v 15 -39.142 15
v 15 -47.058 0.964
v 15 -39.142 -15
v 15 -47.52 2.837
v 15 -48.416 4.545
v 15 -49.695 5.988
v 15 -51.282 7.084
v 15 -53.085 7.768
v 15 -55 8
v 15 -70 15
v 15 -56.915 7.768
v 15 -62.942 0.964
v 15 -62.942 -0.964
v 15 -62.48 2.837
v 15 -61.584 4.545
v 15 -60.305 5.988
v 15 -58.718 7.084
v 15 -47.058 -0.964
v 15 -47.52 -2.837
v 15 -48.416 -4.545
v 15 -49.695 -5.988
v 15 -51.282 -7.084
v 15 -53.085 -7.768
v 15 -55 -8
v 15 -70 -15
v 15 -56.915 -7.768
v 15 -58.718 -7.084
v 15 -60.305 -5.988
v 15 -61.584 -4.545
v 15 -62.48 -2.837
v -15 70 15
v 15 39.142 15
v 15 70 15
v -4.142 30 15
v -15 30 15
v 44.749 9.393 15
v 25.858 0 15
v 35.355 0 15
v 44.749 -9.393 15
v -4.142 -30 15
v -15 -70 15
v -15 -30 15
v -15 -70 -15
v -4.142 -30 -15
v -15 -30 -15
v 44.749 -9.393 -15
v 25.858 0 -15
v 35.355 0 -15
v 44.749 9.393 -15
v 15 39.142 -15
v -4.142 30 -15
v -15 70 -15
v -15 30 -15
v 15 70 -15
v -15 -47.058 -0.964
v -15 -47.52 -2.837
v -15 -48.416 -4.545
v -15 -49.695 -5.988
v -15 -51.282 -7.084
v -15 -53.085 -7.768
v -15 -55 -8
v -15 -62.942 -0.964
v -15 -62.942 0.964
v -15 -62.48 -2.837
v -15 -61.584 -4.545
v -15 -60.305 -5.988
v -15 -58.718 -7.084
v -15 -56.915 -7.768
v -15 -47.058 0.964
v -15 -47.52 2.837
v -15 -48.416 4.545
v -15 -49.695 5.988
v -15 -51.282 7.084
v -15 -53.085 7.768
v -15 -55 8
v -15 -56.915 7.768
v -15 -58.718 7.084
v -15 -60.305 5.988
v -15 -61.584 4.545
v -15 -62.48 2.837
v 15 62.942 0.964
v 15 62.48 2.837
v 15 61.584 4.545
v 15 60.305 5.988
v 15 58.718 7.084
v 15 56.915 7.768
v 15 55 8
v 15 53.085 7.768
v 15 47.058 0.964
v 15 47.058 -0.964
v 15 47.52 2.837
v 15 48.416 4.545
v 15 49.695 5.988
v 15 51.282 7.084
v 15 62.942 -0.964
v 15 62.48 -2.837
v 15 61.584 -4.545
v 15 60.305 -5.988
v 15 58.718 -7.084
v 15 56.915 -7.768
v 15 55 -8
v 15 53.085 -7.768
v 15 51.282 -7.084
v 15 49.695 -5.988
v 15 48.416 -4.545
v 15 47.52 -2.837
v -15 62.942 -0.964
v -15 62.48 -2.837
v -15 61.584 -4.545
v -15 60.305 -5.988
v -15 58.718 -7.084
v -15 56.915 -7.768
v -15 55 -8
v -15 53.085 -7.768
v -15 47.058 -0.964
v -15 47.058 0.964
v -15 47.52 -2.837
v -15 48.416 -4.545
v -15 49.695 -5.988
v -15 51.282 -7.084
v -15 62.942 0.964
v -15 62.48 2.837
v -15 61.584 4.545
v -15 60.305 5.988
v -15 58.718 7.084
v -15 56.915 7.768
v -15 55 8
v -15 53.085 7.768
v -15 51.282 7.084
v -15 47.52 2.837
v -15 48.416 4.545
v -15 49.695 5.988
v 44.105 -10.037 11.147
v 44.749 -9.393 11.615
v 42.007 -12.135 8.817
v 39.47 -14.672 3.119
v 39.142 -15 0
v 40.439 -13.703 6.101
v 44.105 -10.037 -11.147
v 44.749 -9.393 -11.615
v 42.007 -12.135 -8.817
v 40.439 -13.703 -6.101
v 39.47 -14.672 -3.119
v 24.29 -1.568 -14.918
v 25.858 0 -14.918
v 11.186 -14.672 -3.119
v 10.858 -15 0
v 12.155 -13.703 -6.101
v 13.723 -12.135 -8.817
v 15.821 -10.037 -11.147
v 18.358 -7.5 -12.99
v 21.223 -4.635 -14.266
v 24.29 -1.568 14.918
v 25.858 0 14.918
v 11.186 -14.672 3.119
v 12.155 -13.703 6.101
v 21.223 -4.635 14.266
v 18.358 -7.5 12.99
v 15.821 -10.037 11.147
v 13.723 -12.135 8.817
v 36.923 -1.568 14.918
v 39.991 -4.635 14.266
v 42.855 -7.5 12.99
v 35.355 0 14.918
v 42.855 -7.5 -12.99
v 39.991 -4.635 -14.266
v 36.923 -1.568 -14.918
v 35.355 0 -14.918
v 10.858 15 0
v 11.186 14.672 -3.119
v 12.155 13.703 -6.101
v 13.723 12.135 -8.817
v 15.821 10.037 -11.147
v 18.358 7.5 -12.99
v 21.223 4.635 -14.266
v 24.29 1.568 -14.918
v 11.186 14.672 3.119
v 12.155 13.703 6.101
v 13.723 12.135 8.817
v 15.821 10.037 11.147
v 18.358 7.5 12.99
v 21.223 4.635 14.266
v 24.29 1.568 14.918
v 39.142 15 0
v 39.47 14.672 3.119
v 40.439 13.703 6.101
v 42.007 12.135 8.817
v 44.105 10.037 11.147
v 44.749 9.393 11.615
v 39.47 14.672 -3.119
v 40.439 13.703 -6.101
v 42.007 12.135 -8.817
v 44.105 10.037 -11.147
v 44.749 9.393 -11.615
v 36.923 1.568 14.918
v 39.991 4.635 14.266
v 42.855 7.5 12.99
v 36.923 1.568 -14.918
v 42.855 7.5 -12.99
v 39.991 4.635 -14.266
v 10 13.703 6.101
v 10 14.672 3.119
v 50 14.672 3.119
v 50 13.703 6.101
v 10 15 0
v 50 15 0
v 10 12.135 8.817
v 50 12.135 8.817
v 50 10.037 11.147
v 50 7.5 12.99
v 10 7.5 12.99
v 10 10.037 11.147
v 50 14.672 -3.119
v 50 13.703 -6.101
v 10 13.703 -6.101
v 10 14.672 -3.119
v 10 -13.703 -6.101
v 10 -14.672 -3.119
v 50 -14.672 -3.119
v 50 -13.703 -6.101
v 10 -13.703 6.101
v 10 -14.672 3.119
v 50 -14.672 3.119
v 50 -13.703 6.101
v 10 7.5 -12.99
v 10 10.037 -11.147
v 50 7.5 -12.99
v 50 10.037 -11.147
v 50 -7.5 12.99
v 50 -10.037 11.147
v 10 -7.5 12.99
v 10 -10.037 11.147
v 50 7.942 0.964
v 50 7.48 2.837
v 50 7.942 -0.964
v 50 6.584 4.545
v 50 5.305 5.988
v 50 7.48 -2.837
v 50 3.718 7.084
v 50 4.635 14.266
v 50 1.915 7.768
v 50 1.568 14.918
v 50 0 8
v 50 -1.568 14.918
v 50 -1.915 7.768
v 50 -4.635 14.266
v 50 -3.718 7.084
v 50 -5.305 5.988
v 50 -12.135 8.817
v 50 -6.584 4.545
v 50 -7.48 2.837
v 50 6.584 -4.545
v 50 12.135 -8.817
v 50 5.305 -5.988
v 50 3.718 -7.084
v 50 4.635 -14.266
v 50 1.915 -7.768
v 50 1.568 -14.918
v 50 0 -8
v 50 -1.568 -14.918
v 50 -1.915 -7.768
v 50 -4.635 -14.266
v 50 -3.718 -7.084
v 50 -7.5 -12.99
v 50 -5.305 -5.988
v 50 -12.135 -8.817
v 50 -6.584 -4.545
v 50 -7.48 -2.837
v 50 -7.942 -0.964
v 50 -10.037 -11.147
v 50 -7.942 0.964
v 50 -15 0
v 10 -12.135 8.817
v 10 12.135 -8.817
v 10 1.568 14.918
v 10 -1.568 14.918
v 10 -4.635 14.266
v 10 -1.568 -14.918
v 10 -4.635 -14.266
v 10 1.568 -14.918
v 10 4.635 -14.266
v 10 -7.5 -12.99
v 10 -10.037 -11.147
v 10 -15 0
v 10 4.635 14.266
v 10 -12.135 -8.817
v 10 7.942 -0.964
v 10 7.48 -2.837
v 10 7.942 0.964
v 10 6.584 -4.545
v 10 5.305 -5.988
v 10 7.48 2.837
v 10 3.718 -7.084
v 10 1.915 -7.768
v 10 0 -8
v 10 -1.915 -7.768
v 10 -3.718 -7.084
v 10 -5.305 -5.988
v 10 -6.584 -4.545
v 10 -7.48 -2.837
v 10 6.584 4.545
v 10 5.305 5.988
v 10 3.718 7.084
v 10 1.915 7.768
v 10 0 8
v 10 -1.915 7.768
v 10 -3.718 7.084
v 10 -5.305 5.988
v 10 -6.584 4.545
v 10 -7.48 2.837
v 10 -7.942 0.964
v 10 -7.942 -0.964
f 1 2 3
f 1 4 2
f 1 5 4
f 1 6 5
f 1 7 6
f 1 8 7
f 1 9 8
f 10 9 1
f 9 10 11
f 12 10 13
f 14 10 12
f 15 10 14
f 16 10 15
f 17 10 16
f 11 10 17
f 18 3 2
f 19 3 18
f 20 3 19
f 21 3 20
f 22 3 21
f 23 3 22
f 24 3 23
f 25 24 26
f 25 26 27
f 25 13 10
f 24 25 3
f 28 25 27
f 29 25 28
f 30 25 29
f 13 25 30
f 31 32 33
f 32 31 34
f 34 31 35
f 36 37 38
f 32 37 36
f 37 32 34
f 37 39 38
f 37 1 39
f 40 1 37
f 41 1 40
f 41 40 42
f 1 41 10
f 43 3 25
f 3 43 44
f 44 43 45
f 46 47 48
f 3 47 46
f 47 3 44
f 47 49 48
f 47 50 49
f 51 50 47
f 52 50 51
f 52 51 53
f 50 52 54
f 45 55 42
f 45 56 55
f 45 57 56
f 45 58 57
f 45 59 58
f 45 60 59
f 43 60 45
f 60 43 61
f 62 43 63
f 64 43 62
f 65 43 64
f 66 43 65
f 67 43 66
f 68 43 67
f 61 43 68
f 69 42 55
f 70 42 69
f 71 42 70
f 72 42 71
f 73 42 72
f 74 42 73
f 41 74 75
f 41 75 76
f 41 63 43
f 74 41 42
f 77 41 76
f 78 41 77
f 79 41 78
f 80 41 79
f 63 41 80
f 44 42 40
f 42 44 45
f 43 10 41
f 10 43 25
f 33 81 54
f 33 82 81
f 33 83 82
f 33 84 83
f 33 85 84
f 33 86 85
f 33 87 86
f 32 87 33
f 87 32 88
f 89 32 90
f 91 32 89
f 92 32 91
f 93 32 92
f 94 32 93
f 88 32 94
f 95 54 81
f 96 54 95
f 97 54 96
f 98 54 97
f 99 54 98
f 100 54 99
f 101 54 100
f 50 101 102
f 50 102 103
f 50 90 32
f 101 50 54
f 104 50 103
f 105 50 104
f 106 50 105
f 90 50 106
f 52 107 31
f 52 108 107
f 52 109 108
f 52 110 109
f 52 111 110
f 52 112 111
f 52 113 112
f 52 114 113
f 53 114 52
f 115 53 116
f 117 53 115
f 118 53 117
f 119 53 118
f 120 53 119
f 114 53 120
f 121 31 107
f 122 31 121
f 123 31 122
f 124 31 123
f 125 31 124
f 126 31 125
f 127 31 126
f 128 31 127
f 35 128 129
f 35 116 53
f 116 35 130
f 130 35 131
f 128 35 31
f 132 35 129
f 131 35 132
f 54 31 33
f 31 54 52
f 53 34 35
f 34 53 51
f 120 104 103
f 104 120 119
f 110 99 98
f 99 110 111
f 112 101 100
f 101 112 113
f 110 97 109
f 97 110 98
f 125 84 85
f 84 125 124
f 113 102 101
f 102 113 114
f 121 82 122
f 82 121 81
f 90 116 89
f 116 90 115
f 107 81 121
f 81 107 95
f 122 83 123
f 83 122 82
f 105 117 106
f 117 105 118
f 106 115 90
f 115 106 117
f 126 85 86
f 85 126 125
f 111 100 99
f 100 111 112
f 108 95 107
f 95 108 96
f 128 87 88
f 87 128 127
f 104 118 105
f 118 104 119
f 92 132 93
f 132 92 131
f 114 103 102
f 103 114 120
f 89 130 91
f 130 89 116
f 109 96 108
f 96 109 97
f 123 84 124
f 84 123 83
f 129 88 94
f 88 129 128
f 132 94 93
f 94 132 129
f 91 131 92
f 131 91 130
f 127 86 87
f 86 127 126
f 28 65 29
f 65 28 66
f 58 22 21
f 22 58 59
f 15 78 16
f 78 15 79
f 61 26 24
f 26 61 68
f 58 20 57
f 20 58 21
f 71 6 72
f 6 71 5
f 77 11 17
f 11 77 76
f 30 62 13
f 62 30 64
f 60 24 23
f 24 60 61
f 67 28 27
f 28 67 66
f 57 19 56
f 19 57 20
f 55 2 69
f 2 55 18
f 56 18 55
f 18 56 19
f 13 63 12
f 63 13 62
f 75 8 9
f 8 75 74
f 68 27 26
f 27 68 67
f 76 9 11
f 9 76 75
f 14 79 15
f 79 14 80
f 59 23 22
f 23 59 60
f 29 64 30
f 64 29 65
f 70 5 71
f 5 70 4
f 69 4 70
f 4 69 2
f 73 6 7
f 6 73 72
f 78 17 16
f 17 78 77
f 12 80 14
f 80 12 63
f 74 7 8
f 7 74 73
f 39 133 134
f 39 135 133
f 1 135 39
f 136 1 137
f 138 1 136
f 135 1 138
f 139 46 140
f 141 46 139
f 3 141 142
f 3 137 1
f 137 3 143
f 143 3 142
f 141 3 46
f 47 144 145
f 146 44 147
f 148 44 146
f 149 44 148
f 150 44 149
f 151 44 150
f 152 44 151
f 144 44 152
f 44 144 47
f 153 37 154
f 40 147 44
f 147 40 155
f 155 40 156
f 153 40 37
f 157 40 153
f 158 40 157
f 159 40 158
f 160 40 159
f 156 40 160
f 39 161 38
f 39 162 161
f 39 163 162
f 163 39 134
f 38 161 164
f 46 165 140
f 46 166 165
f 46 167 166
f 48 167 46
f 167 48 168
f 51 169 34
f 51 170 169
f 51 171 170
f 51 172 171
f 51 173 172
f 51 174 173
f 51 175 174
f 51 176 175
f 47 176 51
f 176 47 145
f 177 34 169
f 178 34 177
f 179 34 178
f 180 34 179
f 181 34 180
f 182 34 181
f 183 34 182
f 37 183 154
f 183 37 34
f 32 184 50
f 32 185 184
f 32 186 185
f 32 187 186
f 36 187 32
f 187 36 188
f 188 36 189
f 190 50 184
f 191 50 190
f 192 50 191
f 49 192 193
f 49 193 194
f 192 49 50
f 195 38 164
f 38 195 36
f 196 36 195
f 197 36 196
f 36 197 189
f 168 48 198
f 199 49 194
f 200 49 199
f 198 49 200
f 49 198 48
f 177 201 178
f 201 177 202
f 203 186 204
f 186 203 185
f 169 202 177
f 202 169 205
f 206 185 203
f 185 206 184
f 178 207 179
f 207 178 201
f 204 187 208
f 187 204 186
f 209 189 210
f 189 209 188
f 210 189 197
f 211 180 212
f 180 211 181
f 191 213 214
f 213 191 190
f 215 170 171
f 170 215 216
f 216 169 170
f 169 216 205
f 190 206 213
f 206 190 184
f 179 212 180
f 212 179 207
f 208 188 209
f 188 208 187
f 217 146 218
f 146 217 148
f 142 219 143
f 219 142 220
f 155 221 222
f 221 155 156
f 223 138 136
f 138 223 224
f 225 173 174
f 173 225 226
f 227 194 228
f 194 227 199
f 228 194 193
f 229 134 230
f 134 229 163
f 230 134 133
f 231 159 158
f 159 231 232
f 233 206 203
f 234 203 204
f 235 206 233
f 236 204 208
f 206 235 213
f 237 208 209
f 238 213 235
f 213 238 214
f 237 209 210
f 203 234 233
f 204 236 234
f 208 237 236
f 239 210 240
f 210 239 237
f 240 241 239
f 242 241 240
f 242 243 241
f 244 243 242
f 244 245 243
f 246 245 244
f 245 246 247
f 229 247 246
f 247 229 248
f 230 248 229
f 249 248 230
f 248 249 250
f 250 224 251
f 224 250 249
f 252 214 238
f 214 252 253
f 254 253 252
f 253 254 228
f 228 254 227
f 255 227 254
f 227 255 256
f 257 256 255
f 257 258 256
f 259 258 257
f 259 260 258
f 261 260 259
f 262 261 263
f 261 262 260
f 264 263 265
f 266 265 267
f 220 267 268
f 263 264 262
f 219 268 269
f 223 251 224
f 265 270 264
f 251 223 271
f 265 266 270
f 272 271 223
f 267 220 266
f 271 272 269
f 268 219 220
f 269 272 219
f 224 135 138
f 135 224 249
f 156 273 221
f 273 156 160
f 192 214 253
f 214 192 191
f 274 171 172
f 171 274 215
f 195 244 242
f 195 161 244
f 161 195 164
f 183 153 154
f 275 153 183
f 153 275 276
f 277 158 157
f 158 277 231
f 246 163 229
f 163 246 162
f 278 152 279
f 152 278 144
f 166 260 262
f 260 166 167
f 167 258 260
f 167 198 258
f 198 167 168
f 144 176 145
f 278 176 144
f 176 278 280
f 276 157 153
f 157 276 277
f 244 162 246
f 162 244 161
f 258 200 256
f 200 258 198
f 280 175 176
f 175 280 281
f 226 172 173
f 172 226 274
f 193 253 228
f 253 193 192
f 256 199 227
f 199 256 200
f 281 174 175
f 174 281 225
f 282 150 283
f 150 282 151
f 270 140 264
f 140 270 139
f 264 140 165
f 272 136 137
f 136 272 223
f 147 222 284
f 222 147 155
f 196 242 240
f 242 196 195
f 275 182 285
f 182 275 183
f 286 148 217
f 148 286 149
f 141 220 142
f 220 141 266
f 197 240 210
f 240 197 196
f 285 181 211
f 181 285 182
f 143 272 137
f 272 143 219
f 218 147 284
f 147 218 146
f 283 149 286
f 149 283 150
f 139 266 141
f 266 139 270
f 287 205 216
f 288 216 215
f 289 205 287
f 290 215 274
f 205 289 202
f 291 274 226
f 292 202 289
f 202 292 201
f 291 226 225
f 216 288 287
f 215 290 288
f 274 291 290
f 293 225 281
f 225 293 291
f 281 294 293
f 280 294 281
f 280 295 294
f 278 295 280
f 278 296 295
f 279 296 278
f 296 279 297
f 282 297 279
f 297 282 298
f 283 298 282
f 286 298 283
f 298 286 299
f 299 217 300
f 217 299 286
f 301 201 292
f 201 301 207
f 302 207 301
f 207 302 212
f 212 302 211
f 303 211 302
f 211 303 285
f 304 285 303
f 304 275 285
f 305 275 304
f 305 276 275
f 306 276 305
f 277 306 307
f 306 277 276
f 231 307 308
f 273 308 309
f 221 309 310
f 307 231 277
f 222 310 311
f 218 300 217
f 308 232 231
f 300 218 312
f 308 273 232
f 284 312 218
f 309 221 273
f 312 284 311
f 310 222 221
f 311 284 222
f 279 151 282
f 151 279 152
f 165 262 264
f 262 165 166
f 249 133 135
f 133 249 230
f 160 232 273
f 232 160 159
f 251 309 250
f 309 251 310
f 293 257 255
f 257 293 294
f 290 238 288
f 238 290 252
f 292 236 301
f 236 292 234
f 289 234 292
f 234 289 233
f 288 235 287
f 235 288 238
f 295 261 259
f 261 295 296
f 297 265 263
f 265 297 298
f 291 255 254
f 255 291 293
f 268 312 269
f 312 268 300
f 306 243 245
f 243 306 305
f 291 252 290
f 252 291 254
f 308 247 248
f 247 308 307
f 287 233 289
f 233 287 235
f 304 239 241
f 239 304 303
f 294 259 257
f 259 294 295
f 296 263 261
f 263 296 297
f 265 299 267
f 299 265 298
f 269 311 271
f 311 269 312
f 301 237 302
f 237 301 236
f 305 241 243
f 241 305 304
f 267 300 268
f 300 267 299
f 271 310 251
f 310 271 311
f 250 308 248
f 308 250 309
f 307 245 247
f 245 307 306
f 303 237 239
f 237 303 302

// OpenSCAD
difference(){
union(){
union(){
union(){
difference(){
difference(){
union(){
union(){

translate([0,-50,0])
cube (size=[30,40,30] , center=true);
}
translate([0,50,0])
cube (size=[30,40,30] , center=true);
}
translate ([0,55 ,0])
rotate([0,90,0])
cylinder(h=45, r1=8, r2=8, center=true);

}

translate ([0,-55 ,0])
rotate([0,90,0])
cylinder(h=45, r1=8, r2=8, center=true);
}
translate([20,-20,0])
rotate([0,0,-45])
cube(size = [20,50, 30], center=true);
}
translate([20,20,0])
rotate([0,0,-135])
cube(size = [20,50, 30], center=true);
}

rotate([90,0,90])
    translate([0,0,30])
    cylinder (h=40, r1=15,r2=15, center = true);
}
translate ([40,0 ,0])
rotate([0,90,0])
cylinder(h=65, r1=8, r2=8, center=true);
}
